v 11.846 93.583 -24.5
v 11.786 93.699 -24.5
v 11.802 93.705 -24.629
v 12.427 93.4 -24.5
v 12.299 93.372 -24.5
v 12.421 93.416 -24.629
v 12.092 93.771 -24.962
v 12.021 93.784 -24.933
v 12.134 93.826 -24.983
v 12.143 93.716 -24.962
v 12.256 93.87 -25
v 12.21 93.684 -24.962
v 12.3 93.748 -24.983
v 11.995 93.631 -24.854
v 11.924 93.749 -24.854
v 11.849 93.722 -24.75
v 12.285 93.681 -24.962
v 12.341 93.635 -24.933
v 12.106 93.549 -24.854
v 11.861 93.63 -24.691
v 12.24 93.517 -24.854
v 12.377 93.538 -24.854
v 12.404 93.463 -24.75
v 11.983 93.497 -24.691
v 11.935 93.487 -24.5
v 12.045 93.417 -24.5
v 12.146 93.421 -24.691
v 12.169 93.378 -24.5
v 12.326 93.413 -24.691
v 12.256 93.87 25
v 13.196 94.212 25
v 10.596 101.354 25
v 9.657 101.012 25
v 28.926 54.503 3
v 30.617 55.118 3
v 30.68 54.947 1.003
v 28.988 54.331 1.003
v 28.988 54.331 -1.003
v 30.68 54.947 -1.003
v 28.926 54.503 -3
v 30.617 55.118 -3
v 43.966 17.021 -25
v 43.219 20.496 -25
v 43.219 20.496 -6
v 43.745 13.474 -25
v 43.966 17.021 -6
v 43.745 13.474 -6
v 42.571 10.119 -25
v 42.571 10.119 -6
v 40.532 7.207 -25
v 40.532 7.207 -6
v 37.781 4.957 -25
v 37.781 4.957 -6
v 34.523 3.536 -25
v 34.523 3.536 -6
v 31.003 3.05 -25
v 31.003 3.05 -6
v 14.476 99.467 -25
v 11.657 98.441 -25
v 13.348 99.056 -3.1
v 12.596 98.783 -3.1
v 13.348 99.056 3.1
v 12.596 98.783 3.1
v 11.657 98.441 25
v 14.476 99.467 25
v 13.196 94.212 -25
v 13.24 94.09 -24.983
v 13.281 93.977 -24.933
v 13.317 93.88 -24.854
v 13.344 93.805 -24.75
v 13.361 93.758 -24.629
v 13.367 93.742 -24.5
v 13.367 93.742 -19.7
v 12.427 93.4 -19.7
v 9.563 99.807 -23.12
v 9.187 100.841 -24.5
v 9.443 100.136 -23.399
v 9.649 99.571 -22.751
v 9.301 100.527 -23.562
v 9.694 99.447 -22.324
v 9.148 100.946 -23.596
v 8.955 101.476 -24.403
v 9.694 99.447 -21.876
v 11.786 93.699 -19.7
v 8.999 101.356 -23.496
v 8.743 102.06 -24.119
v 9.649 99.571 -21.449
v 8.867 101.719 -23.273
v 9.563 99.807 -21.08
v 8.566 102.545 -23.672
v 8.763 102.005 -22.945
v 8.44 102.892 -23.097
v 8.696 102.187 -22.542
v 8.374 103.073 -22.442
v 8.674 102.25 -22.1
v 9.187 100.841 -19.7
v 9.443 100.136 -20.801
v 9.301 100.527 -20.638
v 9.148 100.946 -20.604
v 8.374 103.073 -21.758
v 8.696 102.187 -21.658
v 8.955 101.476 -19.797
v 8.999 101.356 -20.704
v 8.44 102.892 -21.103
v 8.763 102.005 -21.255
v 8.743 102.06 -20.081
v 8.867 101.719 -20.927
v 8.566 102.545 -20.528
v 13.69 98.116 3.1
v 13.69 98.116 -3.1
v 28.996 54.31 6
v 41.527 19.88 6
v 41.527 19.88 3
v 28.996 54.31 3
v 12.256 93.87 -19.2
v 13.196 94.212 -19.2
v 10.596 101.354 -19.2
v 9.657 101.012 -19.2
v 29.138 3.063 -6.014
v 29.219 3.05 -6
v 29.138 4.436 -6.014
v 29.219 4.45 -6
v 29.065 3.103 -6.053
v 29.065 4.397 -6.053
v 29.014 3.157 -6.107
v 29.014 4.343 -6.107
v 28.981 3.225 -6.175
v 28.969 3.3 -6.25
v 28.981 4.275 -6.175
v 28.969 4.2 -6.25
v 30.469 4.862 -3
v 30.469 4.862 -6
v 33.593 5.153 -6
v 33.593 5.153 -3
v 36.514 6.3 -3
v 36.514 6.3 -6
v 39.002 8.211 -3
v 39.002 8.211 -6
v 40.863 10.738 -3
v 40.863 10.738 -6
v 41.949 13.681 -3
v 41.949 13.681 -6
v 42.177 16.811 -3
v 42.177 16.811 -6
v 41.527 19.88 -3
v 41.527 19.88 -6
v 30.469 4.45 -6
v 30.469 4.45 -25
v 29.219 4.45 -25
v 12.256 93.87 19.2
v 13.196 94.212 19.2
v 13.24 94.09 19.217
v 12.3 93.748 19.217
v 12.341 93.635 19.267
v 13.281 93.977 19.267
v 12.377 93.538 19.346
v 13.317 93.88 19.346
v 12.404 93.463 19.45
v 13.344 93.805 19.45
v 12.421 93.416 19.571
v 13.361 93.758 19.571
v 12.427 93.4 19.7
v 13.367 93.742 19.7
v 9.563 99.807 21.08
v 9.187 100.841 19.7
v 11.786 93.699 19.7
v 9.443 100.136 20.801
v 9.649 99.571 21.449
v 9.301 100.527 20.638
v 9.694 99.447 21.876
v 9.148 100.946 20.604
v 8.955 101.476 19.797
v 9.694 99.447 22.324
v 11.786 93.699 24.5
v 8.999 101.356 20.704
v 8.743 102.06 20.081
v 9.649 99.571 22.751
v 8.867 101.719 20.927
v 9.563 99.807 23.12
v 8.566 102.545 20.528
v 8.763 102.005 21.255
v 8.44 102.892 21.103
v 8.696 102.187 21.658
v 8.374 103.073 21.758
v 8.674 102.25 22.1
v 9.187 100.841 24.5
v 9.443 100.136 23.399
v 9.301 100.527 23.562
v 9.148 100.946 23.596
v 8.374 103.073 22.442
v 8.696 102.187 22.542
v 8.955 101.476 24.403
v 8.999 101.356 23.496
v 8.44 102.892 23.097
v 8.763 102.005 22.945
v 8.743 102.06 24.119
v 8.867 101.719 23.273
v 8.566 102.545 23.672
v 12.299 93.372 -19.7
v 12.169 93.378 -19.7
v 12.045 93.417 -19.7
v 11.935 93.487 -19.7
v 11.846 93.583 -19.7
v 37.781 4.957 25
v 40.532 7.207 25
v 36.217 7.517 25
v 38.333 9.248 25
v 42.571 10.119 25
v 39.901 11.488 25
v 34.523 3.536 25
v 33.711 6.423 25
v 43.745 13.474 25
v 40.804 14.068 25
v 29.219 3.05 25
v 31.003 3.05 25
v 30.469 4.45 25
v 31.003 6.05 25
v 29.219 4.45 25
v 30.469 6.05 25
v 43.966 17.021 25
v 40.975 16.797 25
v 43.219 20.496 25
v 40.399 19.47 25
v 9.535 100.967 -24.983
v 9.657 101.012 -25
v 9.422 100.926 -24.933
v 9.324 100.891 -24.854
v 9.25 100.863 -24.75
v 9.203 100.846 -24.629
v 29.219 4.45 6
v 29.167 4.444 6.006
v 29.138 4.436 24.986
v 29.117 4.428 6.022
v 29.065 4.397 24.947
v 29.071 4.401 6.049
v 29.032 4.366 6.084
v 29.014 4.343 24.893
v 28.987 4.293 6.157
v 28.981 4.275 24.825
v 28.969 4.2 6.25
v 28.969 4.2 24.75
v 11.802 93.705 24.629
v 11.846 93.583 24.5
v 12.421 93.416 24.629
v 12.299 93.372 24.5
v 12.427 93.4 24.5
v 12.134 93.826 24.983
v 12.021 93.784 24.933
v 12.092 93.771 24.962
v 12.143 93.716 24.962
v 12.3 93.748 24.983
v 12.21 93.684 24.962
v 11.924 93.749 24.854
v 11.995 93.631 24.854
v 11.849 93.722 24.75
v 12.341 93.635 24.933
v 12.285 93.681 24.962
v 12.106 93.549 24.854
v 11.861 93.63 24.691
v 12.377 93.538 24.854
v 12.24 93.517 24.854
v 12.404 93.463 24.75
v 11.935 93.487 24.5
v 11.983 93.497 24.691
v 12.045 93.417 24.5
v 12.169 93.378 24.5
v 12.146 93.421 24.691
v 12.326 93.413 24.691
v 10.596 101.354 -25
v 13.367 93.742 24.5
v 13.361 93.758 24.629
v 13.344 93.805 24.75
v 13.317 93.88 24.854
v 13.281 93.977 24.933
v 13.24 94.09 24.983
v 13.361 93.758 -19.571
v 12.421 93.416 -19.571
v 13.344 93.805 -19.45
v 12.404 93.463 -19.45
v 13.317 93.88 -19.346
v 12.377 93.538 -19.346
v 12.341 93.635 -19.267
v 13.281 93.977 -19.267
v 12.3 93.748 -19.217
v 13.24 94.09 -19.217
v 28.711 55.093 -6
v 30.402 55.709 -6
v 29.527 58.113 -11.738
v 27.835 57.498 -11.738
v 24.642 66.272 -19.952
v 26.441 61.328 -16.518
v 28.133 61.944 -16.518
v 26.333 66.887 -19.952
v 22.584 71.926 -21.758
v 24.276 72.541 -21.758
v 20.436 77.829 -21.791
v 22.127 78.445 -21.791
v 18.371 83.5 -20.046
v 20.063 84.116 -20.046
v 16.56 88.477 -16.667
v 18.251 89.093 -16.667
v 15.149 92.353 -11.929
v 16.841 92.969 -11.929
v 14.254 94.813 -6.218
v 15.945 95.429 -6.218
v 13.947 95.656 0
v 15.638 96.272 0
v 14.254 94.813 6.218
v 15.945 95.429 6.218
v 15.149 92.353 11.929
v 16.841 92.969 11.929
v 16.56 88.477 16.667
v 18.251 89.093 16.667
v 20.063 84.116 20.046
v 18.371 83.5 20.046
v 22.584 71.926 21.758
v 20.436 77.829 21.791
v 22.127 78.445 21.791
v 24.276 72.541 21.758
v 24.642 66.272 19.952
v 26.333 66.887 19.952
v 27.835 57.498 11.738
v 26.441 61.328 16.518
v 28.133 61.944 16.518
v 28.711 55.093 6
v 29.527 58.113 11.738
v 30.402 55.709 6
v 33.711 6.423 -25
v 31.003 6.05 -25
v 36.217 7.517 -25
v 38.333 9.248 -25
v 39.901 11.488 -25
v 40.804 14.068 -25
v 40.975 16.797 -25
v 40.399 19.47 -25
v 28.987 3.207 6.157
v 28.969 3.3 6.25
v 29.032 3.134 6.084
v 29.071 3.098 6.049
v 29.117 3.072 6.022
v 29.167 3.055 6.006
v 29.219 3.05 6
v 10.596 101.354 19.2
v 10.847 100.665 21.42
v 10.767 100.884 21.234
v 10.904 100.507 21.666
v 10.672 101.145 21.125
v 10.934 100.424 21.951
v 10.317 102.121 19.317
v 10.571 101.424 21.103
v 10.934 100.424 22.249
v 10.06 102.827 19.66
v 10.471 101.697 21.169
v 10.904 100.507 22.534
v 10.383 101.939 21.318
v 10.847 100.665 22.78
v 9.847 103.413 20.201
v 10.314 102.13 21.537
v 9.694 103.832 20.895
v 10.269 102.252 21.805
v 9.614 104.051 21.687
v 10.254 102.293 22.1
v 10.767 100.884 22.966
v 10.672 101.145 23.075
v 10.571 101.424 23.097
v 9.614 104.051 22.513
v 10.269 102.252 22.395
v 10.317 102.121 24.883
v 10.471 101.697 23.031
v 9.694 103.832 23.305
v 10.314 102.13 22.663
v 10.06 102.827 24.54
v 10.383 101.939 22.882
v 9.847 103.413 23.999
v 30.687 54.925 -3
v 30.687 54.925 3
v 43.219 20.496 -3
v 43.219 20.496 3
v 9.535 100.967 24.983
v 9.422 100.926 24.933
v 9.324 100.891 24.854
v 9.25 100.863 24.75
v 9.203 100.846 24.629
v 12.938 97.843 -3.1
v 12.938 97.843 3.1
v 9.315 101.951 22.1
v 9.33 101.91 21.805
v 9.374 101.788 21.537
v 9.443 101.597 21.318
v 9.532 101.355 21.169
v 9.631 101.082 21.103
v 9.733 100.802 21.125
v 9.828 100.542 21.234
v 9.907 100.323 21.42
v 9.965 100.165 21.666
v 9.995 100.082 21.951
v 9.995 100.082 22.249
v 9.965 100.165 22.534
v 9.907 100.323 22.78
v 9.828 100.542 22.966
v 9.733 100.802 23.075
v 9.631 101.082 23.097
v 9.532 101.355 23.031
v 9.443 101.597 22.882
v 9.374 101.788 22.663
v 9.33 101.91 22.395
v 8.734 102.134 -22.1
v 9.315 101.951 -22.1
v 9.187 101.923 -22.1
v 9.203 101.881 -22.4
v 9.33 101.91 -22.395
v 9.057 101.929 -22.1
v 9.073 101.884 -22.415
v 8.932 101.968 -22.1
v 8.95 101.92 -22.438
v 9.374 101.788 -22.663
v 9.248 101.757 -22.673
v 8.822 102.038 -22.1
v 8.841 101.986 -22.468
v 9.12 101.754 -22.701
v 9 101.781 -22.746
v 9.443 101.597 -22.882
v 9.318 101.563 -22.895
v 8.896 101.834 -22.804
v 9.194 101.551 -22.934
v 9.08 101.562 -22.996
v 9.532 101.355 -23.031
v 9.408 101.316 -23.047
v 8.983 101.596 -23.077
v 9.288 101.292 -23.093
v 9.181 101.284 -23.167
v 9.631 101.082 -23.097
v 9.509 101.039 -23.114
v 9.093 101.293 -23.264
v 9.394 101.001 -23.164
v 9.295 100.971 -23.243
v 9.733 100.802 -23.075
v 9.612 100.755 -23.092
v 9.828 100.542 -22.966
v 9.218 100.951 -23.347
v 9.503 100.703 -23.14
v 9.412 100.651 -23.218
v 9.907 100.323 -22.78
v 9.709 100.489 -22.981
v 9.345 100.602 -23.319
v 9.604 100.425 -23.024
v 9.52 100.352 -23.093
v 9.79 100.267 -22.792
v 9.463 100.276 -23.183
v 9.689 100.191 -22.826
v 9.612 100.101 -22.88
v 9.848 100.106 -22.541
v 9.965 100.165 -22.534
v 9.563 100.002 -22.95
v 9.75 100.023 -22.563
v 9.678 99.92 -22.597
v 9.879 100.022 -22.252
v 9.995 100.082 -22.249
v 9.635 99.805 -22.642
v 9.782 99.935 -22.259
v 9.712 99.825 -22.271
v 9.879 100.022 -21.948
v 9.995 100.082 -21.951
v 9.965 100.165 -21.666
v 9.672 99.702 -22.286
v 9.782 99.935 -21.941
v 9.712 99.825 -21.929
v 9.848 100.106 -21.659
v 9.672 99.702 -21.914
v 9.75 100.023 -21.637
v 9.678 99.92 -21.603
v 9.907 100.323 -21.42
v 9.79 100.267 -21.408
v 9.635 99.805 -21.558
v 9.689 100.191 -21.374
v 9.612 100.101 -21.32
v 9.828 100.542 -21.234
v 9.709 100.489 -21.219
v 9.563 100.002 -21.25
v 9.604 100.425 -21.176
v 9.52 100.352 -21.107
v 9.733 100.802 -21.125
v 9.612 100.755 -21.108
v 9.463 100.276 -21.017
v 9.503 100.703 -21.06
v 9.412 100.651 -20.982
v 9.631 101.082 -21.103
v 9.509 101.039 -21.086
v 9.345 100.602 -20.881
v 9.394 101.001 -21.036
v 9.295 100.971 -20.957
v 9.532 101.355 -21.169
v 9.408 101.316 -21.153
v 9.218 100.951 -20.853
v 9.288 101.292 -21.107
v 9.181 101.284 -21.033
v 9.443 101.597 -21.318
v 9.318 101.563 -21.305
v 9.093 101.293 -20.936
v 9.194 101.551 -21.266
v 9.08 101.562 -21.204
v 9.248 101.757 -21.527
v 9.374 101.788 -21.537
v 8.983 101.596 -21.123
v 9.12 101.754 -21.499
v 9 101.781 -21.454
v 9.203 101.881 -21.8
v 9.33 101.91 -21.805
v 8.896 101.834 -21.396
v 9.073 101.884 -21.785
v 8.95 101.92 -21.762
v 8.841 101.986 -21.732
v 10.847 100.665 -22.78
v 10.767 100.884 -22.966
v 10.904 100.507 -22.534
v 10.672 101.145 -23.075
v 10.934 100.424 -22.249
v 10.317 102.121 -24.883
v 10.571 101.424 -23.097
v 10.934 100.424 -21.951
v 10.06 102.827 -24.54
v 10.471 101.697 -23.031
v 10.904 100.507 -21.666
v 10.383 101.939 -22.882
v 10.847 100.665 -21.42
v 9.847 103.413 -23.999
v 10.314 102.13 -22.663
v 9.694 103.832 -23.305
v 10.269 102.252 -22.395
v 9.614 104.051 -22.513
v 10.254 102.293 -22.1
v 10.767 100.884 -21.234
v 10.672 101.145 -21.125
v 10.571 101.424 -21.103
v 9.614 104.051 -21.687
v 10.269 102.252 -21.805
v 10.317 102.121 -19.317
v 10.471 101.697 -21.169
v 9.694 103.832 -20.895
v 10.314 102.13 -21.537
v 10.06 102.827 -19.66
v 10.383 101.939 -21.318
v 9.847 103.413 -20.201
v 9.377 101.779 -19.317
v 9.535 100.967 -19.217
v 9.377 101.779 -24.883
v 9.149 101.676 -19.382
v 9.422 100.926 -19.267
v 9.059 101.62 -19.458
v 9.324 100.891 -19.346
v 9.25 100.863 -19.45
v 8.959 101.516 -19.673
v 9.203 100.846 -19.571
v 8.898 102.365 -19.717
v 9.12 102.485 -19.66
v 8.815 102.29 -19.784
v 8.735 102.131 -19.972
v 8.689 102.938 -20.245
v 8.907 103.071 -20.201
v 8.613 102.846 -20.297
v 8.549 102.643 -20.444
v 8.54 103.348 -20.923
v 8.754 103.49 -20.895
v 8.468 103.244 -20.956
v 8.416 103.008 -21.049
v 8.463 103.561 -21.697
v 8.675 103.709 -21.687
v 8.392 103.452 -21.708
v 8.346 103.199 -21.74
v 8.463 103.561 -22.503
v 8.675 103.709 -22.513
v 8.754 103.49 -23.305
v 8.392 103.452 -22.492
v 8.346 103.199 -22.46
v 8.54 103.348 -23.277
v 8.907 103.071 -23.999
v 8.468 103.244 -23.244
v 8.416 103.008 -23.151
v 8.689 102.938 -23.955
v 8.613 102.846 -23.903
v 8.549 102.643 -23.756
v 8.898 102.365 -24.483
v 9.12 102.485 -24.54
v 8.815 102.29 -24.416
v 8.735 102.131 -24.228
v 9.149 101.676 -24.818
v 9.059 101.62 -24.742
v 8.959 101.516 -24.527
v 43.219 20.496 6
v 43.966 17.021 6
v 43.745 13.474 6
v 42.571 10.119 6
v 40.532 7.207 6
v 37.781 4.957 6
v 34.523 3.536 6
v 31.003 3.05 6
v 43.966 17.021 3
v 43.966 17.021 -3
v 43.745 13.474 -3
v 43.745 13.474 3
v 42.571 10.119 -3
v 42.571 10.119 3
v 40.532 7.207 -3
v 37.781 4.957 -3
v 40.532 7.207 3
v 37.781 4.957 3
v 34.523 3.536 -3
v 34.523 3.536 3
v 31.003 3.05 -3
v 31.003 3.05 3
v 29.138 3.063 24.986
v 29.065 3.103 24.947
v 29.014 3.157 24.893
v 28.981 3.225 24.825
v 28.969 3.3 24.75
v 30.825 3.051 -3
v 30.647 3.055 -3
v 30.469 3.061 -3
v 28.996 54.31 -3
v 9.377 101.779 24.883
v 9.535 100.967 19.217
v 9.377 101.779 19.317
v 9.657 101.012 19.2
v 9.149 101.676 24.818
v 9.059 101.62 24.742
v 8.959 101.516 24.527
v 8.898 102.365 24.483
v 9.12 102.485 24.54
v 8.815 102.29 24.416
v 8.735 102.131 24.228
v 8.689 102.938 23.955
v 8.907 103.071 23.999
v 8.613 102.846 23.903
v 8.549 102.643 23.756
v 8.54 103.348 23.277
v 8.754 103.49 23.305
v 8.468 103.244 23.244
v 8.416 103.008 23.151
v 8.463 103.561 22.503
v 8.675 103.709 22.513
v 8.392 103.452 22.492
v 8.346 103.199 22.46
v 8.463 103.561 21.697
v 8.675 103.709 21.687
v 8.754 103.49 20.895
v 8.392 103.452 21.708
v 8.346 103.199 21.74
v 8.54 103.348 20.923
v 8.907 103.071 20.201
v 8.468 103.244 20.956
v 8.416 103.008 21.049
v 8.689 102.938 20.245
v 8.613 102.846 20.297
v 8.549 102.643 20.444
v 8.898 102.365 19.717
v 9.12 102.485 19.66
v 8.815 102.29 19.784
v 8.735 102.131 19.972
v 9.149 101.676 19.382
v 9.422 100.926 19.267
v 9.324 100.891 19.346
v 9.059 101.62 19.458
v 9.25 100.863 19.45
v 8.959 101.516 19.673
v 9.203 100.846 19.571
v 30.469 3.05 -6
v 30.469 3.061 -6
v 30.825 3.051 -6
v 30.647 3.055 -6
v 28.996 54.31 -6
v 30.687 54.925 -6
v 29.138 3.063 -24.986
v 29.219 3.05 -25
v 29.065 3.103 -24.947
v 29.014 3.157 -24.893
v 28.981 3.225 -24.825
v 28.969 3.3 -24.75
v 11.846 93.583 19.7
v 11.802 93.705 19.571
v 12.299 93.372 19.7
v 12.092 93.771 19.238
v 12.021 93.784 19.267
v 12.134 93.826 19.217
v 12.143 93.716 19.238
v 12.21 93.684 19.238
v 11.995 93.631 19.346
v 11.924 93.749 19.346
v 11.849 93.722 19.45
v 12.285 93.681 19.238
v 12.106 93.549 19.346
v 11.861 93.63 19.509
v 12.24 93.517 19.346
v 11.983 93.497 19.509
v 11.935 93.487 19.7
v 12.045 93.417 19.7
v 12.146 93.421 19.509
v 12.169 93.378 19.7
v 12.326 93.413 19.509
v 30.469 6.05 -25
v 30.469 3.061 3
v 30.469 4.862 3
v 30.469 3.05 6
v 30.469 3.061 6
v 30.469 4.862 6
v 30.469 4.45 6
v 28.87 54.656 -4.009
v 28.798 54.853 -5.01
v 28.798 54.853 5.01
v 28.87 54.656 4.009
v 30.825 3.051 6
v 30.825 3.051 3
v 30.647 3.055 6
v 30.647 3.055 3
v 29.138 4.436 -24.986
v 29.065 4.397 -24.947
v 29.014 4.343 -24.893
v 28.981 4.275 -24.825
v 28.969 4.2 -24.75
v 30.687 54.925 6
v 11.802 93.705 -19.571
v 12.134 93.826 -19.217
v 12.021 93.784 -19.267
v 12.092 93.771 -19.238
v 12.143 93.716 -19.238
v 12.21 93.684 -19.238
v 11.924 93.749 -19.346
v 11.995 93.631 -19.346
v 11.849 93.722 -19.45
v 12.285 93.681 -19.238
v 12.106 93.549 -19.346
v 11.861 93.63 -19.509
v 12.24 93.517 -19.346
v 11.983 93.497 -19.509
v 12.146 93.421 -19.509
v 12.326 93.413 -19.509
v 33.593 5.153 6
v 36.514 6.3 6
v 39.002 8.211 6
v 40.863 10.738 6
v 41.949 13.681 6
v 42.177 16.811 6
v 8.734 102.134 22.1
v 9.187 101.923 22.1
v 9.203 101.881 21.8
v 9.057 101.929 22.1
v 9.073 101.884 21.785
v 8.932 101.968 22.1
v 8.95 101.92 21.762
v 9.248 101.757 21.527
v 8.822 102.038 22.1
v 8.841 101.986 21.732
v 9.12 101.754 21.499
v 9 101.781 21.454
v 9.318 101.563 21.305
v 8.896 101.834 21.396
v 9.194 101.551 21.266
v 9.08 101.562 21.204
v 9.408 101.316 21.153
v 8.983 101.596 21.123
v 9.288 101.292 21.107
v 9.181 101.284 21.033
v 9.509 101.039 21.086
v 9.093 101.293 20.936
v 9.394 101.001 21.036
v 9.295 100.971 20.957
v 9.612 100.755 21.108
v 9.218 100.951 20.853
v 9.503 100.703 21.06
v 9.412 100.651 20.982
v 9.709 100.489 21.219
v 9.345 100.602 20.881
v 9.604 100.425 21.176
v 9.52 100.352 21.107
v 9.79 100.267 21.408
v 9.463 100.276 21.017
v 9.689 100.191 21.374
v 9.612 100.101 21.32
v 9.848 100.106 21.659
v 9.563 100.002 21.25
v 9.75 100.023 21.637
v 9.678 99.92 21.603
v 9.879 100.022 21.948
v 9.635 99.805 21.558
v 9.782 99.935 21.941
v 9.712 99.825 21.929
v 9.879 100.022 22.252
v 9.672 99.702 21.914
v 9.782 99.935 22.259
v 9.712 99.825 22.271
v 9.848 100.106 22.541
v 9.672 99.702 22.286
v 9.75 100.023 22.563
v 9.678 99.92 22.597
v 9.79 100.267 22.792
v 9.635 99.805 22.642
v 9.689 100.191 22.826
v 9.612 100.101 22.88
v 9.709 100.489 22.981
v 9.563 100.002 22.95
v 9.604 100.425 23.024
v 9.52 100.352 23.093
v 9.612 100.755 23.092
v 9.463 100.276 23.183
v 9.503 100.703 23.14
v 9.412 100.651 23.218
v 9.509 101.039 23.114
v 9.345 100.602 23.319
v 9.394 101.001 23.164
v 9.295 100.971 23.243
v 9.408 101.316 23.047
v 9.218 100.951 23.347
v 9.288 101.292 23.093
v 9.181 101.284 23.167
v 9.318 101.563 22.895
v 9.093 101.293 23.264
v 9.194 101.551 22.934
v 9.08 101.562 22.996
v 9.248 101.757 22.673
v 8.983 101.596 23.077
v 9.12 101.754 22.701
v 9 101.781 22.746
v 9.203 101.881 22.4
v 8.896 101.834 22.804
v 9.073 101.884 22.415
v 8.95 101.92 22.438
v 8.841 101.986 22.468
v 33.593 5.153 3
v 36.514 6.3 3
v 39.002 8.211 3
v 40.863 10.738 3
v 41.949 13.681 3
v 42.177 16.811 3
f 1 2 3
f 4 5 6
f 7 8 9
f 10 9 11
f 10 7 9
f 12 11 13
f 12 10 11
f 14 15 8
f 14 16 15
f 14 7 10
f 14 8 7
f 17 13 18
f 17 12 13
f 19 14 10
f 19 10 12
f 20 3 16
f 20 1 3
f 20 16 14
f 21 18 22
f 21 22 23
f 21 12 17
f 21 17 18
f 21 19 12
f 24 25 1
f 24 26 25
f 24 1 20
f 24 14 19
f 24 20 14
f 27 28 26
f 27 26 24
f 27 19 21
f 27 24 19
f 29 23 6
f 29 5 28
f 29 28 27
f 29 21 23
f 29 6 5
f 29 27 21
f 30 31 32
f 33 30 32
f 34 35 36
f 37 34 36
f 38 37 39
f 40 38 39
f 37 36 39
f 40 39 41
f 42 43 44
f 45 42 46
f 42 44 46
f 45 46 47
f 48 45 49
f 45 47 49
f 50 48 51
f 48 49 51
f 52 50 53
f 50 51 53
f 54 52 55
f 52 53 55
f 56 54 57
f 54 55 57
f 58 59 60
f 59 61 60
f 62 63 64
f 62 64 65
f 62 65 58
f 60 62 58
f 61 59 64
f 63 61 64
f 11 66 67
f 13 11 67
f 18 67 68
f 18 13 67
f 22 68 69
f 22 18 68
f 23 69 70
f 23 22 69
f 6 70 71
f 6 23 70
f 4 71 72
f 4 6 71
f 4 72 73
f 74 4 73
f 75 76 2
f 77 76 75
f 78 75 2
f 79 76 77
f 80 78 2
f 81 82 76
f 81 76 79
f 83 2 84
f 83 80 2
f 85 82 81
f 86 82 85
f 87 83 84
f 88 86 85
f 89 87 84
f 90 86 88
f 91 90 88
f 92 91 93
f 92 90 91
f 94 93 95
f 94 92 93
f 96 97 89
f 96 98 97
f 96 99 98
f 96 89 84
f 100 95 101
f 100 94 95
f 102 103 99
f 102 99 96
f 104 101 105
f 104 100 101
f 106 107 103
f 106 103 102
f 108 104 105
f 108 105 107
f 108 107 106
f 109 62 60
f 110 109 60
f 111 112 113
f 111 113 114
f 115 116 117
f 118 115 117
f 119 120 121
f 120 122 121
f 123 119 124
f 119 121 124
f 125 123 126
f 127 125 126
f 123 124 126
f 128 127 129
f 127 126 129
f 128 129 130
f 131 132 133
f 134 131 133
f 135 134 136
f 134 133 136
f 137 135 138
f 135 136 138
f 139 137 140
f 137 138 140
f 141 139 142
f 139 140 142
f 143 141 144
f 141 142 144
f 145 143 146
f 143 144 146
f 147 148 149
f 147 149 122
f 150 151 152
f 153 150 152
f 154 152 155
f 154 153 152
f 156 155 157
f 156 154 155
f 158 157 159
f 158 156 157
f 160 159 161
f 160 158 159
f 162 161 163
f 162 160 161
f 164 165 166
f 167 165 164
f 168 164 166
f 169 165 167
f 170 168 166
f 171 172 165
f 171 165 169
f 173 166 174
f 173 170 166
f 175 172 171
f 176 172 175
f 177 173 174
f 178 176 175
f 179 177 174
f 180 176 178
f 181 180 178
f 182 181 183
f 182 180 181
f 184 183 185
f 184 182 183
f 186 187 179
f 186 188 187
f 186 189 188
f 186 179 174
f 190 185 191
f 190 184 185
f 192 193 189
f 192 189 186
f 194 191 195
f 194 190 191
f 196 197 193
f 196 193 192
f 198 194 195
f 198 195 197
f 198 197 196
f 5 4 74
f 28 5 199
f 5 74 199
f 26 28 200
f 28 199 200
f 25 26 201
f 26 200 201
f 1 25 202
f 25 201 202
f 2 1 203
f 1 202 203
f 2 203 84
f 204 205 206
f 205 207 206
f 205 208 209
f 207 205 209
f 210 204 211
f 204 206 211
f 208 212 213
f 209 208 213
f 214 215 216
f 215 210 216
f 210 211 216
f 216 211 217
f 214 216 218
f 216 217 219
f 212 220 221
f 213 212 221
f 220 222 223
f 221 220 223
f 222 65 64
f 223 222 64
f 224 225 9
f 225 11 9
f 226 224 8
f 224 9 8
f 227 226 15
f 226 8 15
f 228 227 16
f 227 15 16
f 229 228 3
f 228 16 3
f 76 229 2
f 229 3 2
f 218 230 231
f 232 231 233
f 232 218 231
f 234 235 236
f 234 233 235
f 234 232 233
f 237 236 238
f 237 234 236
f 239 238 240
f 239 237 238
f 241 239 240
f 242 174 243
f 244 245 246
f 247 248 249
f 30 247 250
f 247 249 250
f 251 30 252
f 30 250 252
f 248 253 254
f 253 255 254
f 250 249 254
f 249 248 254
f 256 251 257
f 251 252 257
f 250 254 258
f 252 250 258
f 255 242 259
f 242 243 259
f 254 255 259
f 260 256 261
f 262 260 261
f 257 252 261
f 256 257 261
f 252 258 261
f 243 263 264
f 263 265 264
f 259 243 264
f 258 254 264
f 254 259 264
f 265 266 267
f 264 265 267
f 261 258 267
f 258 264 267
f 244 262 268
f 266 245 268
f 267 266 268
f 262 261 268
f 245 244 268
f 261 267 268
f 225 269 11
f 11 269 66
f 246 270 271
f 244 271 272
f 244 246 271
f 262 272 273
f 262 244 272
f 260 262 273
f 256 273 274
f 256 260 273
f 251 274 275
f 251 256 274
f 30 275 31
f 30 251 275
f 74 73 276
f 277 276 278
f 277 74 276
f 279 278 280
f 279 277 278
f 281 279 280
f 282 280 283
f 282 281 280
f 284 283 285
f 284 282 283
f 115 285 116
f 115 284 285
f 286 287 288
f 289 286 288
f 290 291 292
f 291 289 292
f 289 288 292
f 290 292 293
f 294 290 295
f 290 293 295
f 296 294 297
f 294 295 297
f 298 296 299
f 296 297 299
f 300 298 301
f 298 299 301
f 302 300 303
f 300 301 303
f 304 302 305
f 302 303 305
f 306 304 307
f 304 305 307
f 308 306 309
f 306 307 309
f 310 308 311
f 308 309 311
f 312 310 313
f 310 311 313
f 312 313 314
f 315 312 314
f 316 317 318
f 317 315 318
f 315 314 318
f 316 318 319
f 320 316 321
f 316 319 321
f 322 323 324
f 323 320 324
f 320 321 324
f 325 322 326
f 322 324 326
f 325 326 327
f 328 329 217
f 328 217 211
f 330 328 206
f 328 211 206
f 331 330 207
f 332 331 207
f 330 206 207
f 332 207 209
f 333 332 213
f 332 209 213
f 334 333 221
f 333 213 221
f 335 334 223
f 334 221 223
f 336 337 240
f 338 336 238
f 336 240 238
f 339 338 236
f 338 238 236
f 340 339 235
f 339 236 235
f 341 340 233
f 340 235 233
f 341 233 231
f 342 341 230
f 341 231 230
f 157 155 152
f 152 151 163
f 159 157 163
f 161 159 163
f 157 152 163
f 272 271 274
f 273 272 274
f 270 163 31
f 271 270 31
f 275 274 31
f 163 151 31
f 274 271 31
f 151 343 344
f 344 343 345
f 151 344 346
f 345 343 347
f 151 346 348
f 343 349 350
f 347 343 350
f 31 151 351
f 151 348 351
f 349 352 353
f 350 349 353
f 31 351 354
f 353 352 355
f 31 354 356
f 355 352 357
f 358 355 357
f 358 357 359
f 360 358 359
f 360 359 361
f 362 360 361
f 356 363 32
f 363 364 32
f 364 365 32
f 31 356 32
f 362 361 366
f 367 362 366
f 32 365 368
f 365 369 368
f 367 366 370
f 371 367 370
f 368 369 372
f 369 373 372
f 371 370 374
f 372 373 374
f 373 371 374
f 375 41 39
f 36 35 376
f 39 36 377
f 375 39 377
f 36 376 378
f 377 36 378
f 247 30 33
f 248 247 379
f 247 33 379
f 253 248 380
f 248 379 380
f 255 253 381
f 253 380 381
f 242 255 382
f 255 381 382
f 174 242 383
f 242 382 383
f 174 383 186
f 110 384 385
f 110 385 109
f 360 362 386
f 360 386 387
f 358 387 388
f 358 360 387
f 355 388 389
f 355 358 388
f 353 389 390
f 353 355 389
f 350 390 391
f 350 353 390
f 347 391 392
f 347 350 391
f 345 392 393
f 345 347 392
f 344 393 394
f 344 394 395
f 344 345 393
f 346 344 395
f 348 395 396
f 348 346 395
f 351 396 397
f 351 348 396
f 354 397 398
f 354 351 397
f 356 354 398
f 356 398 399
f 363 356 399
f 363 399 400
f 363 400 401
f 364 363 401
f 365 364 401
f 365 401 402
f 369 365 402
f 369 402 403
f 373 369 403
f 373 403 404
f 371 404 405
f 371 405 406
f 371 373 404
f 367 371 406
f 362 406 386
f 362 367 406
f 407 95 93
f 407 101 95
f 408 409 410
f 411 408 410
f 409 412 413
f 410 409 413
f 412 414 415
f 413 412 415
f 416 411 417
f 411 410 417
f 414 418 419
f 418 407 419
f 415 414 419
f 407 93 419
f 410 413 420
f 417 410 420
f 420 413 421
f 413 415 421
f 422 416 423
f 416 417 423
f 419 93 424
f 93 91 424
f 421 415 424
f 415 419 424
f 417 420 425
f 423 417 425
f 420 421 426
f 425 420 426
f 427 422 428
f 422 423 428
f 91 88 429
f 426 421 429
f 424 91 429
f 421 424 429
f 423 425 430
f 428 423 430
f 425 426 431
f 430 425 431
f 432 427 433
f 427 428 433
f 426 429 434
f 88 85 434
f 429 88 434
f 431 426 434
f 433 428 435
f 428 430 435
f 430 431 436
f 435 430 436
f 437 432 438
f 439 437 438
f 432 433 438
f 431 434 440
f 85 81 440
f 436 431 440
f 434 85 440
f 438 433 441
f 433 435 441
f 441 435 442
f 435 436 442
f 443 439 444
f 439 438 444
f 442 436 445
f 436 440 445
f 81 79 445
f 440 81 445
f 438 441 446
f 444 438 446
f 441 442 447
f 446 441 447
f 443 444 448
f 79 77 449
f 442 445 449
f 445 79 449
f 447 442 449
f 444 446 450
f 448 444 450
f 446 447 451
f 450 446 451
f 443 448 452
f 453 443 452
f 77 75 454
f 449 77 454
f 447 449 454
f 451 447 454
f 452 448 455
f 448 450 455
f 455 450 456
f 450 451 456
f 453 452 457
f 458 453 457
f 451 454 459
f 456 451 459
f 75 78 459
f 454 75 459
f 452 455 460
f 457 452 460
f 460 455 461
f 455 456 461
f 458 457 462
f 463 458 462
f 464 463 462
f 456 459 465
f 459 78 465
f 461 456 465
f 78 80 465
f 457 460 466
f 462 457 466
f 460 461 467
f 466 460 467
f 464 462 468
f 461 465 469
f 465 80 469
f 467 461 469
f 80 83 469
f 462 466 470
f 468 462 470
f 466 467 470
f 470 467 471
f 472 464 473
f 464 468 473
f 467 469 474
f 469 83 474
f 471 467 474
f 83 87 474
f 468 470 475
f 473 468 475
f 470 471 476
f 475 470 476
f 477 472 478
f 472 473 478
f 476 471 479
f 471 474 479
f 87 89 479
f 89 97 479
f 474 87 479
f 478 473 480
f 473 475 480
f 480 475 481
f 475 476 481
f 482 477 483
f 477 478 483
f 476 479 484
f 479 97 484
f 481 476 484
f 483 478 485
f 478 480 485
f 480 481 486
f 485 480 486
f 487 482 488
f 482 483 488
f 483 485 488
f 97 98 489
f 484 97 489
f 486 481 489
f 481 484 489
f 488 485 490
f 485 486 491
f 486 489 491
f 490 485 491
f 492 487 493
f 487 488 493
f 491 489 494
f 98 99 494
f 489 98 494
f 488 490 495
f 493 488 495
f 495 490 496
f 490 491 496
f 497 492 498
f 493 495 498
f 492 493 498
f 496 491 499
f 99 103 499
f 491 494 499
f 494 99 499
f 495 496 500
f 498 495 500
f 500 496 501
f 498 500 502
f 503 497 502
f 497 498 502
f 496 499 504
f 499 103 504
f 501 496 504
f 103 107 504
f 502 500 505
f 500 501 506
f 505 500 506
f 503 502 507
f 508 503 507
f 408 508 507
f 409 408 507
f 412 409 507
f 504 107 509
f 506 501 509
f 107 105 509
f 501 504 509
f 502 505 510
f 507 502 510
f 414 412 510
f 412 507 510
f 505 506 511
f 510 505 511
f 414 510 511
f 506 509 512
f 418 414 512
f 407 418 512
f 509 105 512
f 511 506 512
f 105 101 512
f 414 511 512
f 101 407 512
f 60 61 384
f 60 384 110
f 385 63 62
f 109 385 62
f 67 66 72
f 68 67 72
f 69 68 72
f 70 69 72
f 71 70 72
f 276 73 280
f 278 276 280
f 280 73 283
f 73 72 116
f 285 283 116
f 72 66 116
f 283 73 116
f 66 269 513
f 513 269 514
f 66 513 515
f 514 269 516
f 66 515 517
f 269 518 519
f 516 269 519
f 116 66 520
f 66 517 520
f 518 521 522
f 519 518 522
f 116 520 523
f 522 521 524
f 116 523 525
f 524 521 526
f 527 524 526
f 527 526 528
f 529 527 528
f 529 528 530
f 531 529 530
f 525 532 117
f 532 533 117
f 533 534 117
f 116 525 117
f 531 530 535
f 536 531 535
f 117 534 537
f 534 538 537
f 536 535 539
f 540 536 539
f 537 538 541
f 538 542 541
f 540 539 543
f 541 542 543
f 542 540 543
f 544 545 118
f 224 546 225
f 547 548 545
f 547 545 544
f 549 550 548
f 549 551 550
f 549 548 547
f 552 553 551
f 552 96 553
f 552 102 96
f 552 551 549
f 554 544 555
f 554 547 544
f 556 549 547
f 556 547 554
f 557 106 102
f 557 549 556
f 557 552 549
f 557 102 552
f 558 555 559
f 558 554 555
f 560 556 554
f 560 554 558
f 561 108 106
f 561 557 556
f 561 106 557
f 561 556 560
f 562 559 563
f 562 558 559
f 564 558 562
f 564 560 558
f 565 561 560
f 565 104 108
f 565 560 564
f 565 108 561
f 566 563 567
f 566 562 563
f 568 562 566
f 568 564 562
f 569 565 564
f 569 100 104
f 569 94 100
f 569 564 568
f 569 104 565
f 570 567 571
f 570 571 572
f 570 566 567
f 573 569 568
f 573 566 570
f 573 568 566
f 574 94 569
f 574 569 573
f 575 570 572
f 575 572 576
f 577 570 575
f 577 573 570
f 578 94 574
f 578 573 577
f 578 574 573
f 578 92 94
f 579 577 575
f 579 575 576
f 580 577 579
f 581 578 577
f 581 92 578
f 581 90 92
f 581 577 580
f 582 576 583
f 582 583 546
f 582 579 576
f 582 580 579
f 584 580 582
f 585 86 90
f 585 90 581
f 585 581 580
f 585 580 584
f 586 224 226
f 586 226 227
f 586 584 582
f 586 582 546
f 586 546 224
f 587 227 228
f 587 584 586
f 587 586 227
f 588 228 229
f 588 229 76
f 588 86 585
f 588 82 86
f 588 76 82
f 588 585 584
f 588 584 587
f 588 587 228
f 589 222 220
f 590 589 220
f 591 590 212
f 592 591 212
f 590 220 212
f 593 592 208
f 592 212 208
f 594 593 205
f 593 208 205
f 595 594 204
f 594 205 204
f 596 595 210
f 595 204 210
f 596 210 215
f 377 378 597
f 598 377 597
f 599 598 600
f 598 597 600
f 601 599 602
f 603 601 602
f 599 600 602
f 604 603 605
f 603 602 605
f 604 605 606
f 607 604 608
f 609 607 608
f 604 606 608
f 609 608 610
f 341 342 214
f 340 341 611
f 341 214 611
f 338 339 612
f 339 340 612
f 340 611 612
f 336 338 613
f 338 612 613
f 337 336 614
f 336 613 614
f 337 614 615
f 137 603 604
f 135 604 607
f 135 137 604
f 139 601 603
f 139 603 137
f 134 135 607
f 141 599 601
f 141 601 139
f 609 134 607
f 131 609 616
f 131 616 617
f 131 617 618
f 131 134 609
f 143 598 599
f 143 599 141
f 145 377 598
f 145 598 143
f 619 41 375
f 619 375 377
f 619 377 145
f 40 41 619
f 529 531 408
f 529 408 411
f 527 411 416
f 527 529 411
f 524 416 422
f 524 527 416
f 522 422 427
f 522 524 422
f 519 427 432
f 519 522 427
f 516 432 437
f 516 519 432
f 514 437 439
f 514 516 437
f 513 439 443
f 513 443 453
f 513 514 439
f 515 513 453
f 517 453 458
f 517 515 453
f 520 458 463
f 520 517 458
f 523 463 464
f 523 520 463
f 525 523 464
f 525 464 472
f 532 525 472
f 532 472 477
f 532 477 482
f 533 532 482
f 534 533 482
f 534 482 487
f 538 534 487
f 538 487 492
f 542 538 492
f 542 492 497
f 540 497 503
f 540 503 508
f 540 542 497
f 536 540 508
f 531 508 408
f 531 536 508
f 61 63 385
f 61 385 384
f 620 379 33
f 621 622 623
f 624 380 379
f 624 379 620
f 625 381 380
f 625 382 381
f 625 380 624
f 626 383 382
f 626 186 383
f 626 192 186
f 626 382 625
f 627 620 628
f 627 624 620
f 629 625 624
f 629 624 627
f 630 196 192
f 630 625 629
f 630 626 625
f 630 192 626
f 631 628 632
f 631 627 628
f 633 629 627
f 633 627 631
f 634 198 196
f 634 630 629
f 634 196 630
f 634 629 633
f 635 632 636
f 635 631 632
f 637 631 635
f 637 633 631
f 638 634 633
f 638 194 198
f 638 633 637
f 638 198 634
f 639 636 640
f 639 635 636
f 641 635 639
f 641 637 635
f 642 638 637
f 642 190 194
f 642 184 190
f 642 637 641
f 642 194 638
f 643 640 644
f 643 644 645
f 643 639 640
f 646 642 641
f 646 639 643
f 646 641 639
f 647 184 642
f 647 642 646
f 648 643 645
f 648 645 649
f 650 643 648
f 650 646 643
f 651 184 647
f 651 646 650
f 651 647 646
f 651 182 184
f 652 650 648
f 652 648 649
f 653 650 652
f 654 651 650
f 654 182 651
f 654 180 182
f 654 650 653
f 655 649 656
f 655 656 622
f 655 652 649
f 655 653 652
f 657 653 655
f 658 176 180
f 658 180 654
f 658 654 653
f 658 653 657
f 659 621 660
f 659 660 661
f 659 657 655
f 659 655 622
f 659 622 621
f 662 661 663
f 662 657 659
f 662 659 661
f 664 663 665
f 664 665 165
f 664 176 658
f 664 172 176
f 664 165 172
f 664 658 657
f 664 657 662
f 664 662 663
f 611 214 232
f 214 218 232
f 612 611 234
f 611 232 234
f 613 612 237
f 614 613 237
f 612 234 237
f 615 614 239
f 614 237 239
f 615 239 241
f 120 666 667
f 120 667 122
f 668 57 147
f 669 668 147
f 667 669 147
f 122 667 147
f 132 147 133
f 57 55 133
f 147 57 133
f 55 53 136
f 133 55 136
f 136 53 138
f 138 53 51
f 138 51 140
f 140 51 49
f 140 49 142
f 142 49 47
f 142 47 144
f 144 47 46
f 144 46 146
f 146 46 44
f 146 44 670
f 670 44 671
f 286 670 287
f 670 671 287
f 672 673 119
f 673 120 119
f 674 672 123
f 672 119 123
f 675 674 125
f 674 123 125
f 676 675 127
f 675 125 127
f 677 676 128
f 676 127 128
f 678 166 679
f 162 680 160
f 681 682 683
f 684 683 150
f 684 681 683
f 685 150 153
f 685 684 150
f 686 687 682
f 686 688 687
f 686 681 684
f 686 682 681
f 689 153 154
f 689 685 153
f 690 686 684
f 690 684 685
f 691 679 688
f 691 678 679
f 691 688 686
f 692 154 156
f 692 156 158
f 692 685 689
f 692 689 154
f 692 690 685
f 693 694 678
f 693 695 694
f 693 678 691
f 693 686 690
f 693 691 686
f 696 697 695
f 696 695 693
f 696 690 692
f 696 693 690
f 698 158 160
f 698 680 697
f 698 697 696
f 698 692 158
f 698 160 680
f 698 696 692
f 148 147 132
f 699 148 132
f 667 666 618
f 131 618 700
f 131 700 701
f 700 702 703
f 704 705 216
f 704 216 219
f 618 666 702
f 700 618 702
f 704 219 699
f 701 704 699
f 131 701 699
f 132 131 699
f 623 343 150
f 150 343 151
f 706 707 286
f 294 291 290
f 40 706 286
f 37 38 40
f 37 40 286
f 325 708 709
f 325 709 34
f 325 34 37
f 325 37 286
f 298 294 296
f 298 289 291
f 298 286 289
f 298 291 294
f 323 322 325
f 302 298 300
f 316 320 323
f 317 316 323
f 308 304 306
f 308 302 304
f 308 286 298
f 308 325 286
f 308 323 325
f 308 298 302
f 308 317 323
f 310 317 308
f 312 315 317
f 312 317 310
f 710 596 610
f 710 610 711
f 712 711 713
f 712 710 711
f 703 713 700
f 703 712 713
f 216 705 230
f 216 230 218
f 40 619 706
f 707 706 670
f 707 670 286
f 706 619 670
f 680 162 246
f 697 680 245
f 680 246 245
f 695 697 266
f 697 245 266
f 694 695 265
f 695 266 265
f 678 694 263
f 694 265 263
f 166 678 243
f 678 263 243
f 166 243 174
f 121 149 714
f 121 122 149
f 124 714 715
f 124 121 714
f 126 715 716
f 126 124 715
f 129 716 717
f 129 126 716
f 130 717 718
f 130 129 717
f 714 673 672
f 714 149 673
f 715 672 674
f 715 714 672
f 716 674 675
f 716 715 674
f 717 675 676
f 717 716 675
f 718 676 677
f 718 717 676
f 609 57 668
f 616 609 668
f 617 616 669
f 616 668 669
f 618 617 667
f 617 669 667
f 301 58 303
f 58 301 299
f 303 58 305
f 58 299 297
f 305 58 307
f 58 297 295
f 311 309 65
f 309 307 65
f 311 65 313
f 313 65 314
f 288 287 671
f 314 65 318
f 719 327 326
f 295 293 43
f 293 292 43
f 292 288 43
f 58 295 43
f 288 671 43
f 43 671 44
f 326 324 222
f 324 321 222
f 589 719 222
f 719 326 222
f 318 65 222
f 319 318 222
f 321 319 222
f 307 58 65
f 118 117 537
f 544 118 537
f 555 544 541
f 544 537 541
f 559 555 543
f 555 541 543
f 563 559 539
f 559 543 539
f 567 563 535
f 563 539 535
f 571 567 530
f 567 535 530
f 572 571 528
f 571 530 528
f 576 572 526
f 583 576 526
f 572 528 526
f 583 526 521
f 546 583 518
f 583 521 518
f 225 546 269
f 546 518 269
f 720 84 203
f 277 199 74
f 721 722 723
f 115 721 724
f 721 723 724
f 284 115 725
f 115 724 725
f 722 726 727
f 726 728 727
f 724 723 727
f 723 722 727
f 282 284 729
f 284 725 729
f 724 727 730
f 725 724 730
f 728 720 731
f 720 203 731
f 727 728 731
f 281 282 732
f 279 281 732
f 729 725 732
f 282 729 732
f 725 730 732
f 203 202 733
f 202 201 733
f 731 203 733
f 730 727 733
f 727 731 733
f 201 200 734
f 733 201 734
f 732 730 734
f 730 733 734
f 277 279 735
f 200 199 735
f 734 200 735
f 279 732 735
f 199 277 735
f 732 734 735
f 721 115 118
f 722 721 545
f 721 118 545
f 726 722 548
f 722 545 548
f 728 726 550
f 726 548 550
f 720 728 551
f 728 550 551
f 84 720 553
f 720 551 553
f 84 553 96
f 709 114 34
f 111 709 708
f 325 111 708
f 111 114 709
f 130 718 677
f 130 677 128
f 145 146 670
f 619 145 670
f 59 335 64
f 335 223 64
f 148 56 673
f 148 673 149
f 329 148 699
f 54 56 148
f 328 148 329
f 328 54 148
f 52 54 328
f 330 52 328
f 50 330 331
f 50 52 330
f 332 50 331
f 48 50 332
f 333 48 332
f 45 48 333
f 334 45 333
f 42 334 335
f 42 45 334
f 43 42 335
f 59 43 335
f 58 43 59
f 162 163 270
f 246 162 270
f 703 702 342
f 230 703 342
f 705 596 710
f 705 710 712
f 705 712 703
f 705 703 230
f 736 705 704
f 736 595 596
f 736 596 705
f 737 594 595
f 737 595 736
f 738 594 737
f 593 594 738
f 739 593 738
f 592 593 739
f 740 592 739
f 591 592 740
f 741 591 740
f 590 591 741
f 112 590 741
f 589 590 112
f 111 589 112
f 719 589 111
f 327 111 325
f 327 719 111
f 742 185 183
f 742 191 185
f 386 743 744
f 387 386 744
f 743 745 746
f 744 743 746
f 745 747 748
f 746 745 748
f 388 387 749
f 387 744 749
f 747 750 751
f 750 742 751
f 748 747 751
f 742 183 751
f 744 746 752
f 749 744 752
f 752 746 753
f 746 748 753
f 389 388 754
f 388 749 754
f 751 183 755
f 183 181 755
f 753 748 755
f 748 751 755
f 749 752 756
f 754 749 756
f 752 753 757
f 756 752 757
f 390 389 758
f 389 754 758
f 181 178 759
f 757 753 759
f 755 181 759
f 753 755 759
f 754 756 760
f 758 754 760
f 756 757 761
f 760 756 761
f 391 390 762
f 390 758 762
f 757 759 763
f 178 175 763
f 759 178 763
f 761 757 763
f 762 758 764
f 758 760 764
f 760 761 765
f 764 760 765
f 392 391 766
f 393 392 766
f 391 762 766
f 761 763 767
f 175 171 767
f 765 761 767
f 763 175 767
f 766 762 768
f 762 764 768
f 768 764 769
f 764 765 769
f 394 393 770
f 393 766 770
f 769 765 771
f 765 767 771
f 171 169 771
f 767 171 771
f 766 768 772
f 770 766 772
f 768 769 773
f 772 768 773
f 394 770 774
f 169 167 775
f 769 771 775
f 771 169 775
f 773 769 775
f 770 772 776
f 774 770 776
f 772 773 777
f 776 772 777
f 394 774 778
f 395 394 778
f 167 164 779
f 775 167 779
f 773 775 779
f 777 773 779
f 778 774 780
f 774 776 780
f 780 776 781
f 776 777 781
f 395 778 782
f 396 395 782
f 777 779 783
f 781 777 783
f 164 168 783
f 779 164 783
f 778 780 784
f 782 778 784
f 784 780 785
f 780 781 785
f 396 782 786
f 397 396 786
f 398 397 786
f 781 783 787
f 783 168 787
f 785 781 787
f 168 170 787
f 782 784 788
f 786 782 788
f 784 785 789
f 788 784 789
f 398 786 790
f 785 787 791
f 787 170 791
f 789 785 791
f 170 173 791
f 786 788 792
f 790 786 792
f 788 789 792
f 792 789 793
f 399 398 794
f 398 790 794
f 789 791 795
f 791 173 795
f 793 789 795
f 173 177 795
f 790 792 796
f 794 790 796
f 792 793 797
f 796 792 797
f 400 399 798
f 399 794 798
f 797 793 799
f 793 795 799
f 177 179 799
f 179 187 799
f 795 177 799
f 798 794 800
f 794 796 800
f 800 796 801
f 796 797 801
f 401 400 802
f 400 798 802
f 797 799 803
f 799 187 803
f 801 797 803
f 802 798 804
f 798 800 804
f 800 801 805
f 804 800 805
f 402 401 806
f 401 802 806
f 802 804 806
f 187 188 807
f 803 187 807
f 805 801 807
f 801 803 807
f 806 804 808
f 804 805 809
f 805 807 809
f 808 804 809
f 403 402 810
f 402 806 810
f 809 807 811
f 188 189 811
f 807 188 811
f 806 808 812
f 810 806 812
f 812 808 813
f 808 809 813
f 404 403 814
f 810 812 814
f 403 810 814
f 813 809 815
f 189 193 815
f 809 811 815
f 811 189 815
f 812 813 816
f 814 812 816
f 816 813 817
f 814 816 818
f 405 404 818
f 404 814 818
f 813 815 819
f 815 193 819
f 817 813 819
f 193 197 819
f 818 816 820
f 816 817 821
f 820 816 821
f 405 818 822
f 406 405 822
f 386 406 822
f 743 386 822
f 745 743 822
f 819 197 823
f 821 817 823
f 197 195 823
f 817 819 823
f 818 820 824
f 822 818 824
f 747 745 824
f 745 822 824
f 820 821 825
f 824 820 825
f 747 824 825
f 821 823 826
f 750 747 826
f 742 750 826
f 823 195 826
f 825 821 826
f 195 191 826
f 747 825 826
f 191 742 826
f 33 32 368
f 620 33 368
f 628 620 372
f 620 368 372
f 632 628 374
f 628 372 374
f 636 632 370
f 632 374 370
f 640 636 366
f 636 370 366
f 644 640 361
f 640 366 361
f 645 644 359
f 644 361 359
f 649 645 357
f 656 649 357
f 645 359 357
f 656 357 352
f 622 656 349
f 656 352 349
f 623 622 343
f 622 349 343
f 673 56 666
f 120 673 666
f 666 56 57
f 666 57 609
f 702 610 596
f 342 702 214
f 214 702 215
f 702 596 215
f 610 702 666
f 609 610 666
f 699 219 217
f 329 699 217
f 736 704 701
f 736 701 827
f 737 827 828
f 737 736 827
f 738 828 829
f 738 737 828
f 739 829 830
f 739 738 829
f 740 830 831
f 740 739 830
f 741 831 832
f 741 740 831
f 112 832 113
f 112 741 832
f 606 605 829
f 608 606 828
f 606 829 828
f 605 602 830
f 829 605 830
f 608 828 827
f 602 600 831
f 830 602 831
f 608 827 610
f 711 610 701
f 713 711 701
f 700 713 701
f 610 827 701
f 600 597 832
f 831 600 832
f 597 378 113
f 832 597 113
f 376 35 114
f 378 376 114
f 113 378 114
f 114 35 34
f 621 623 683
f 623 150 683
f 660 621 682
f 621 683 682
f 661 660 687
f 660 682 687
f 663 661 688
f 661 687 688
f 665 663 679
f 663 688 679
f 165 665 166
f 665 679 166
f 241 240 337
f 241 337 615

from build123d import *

# Parameters (mm, degrees)
EXTRUDE_1_DEPTH       = 25
SKETCH_4_R            = 22
CUT_EXTRUDE_1_DEPTH   = 1.8
CUT_EXTRUDE_START     = 6
CUT_EXTRUDE_1_2_DEPTH = 3
SKETCH_11_W           = 19
SKETCH_11_H           = 1.4
EXTRUDE_3_DEPTH       = 1.5
FILLET_1_R            = 0.25
SKETCH_15_R           = 1
EXTRUDE_1_2_DEPTH     = 1.5
EXTRUDE_1_2_2_DEPTH   = 1.5
SKETCH_14_W           = 0.8
SKETCH_14_H           = 6.2
CUT_EXTRUDE_2_DEPTH   = 1
FILLET_2_R            = 0.5
FILLET_3_R            = 0.5


with BuildPart() as part:
    # 草图2 → Extrude 1 (new, symmetric)
    with BuildSketch(Plane.XY):
        with BuildLine():
            Line((30.469246085, 6.049687275), (31.002548264, 6.049687275))
            ThreePointArc((31.002548264, 6.049687275), (39.194068707, 10.313922912), (40.399474472, 19.469888708))
            Line((40.399474472, 19.469888708), (11.65650271, 98.440554593))
            Line((11.65650271, 98.440554593), (14.475580572, 99.466615023))
            Line((14.475580572, 99.466615023), (43.218552334, 20.495949138))
            ThreePointArc((43.218552334, 20.495949138), (41.65152484, 8.593193603), (31.002548264, 3.049687275))
            Line((31.002548264, 3.049687275), (30.469246085, 3.049687275))
            Line((30.469246085, 3.049687275), (30.469246085, 6.049687275))
        make_face()
    extrude(amount=EXTRUDE_1_DEPTH, both=True)

    # 草图4 → Cut-Extrude 1 (cut)
    with BuildSketch(Plane(origin=(44.750213172, 16.287745572, 0), x_dir=(0, 0, -1), z_dir=(0.9396926207859071, 0.3420201433256726, 0))):
        with Locations(Location((0, 63.117104009, 0), (0, 0, 90))):
            Circle(SKETCH_4_R)
    extrude(amount=-CUT_EXTRUDE_1_DEPTH, mode=Mode.SUBTRACT)

    # 草图3 → Cut-Extrude 1 2 (cut)
    with BuildSketch(Plane.XY.offset(CUT_EXTRUDE_START)):
        with BuildLine():
            ThreePointArc((30.469246085, 4.86239141), (40.021460965, 9.408963392), (41.527105617, 19.88031288))
            Line((41.527105617, 19.88031288), (28.995888649, 54.30954854))
            Line((28.995888649, 54.30954854), (27.969828219, 57.128626402))
            Line((27.969828219, 57.128626402), (29.661274936, 57.74426266))
            Line((29.661274936, 57.74426266), (30.687335366, 54.925184798))
            Line((30.687335366, 54.925184798), (43.218552334, 20.495949138))
            ThreePointArc((43.218552334, 20.495949138), (41.470929078, 8.341704197), (30.383536806, 3.064433145))
            Line((30.383536806, 3.064433145), (30.469246085, 4.86239141))
        make_face()
    cut_extrude_1_2 = extrude(amount=-CUT_EXTRUDE_1_2_DEPTH, mode=Mode.SUBTRACT)

    # 镜向1: Cut-Extrude 1 2 across plane
    add(cut_extrude_1_2.mirror(Plane.XY), mode=Mode.SUBTRACT)

    # 草图11 → 底部卡扣凸台-拉伸3 (add)
    with BuildSketch(Plane.ZY.offset(-30.469246085)):
        with Locations((-15.5, 3.749687275)):
            Rectangle(SKETCH_11_W, SKETCH_11_H)
        with Locations((15.5, 3.749687275)):
            Rectangle(SKETCH_11_W, SKETCH_11_H)
    extrude(amount=EXTRUDE_3_DEPTH)

    # 底部卡扣圆角1
    fillet_1_edges = [part.edges().sort_by_distance(p)[0] for p in [
        (28.969246085, 3.749687275, 6),
        (28.969246085, 3.049687275, 15.5),
        (28.969246085, 3.749687275, 25),
        (28.969246085, 4.449687275, 15.5),
        (28.969246085, 3.749687275, -25),
        (28.969246085, 3.049687275, -15.5),
        (28.969246085, 3.749687275, -6),
        (28.969246085, 4.449687275, -15.5),
    ]]
    fillet(fillet_1_edges, radius=FILLET_1_R)

    # 草图14 → 扣部切除-拉伸2 (cut)
    with BuildSketch(Plane(origin=(-30.2746326, 83.178869451, 0), x_dir=(0.9396926207859067, 0.3420201433256736, 0), z_dir=(-0.3420201433256736, 0.9396926207859068, 0))):
        with Locations((46.022182172, 0)):
            Rectangle(SKETCH_14_W, SKETCH_14_H)
    extrude(amount=-CUT_EXTRUDE_2_DEPTH, mode=Mode.SUBTRACT)


with BuildPart() as body_2:
    # 草图15 → Extrude 1 2 (new body)
    with BuildSketch(Plane(origin=(41.93113531, 15.261685142, 0), x_dir=(0, 0, 1), z_dir=(-0.9396926207859068, -0.34202014332567304, 0))):
        with BuildLine():
            Line((-25, 91.617104009), (-25, 83.517104009))
            Line((-25, 83.517104009), (-19.2, 83.517104009))
            Line((-19.2, 83.517104009), (-19.2, 91.617104009))
            ThreePointArc((-19.2, 91.617104009), (-22.1, 94.517104009), (-25, 91.617104009))
        make_face()
        with Locations(Location((-22.1, 91.617104009, 0), (0, 0, 90))):
            Circle(SKETCH_15_R, mode=Mode.SUBTRACT)
    extrude(amount=EXTRUDE_1_2_DEPTH)

    # 螺丝圆角2
    fillet_2_edges = [body_2.edges().sort_by_distance(p)[0] for p in [
        (9.528721478, 99.900878881, -22.1),
        (11.957064495, 93.229061274, -22.1),
        (10.571882915, 97.034816388, -19.2),
        (8.194842919, 103.565680103, -22.1),
        (12.661833961, 93.485576381, -19.2),
        (12.661833961, 93.485576381, -25),
        (10.571882915, 97.034816388, -25),
    ]]
    fillet(fillet_2_edges, radius=FILLET_2_R)


with BuildPart() as body_3:
    # 草图15 → Extrude 1 2 2 (new body)
    with BuildSketch(Plane(origin=(41.93113531, 15.261685142, 0), x_dir=(0, 0, 1), z_dir=(-0.9396926207859068, -0.34202014332567304, 0))):
        with BuildLine():
            Line((19.2, 91.617104009), (19.2, 83.517104009))
            Line((19.2, 83.517104009), (25, 83.517104009))
            Line((25, 83.517104009), (25, 91.617104009))
            ThreePointArc((25, 91.617104009), (22.1, 94.517104009), (19.2, 91.617104009))
        make_face()
        with Locations(Location((22.1, 91.617104009, 0), (0, 0, 90))):
            Circle(SKETCH_15_R, mode=Mode.SUBTRACT)
    extrude(amount=EXTRUDE_1_2_2_DEPTH)

    # 螺丝圆角3
    fillet_3_edges = [body_3.edges().sort_by_distance(p)[0] for p in [
        (9.528721478, 99.900878881, 22.1),
        (11.957064495, 93.229061274, 22.1),
        (10.571882915, 97.034816388, 25),
        (8.194842919, 103.565680103, 22.1),
        (12.661833961, 93.485576381, 25),
        (12.661833961, 93.485576381, 19.2),
        (10.571882915, 97.034816388, 19.2),
    ]]
    fillet(fillet_3_edges, radius=FILLET_3_R)


solid = Compound([part.part, body_2.part, body_3.part])
